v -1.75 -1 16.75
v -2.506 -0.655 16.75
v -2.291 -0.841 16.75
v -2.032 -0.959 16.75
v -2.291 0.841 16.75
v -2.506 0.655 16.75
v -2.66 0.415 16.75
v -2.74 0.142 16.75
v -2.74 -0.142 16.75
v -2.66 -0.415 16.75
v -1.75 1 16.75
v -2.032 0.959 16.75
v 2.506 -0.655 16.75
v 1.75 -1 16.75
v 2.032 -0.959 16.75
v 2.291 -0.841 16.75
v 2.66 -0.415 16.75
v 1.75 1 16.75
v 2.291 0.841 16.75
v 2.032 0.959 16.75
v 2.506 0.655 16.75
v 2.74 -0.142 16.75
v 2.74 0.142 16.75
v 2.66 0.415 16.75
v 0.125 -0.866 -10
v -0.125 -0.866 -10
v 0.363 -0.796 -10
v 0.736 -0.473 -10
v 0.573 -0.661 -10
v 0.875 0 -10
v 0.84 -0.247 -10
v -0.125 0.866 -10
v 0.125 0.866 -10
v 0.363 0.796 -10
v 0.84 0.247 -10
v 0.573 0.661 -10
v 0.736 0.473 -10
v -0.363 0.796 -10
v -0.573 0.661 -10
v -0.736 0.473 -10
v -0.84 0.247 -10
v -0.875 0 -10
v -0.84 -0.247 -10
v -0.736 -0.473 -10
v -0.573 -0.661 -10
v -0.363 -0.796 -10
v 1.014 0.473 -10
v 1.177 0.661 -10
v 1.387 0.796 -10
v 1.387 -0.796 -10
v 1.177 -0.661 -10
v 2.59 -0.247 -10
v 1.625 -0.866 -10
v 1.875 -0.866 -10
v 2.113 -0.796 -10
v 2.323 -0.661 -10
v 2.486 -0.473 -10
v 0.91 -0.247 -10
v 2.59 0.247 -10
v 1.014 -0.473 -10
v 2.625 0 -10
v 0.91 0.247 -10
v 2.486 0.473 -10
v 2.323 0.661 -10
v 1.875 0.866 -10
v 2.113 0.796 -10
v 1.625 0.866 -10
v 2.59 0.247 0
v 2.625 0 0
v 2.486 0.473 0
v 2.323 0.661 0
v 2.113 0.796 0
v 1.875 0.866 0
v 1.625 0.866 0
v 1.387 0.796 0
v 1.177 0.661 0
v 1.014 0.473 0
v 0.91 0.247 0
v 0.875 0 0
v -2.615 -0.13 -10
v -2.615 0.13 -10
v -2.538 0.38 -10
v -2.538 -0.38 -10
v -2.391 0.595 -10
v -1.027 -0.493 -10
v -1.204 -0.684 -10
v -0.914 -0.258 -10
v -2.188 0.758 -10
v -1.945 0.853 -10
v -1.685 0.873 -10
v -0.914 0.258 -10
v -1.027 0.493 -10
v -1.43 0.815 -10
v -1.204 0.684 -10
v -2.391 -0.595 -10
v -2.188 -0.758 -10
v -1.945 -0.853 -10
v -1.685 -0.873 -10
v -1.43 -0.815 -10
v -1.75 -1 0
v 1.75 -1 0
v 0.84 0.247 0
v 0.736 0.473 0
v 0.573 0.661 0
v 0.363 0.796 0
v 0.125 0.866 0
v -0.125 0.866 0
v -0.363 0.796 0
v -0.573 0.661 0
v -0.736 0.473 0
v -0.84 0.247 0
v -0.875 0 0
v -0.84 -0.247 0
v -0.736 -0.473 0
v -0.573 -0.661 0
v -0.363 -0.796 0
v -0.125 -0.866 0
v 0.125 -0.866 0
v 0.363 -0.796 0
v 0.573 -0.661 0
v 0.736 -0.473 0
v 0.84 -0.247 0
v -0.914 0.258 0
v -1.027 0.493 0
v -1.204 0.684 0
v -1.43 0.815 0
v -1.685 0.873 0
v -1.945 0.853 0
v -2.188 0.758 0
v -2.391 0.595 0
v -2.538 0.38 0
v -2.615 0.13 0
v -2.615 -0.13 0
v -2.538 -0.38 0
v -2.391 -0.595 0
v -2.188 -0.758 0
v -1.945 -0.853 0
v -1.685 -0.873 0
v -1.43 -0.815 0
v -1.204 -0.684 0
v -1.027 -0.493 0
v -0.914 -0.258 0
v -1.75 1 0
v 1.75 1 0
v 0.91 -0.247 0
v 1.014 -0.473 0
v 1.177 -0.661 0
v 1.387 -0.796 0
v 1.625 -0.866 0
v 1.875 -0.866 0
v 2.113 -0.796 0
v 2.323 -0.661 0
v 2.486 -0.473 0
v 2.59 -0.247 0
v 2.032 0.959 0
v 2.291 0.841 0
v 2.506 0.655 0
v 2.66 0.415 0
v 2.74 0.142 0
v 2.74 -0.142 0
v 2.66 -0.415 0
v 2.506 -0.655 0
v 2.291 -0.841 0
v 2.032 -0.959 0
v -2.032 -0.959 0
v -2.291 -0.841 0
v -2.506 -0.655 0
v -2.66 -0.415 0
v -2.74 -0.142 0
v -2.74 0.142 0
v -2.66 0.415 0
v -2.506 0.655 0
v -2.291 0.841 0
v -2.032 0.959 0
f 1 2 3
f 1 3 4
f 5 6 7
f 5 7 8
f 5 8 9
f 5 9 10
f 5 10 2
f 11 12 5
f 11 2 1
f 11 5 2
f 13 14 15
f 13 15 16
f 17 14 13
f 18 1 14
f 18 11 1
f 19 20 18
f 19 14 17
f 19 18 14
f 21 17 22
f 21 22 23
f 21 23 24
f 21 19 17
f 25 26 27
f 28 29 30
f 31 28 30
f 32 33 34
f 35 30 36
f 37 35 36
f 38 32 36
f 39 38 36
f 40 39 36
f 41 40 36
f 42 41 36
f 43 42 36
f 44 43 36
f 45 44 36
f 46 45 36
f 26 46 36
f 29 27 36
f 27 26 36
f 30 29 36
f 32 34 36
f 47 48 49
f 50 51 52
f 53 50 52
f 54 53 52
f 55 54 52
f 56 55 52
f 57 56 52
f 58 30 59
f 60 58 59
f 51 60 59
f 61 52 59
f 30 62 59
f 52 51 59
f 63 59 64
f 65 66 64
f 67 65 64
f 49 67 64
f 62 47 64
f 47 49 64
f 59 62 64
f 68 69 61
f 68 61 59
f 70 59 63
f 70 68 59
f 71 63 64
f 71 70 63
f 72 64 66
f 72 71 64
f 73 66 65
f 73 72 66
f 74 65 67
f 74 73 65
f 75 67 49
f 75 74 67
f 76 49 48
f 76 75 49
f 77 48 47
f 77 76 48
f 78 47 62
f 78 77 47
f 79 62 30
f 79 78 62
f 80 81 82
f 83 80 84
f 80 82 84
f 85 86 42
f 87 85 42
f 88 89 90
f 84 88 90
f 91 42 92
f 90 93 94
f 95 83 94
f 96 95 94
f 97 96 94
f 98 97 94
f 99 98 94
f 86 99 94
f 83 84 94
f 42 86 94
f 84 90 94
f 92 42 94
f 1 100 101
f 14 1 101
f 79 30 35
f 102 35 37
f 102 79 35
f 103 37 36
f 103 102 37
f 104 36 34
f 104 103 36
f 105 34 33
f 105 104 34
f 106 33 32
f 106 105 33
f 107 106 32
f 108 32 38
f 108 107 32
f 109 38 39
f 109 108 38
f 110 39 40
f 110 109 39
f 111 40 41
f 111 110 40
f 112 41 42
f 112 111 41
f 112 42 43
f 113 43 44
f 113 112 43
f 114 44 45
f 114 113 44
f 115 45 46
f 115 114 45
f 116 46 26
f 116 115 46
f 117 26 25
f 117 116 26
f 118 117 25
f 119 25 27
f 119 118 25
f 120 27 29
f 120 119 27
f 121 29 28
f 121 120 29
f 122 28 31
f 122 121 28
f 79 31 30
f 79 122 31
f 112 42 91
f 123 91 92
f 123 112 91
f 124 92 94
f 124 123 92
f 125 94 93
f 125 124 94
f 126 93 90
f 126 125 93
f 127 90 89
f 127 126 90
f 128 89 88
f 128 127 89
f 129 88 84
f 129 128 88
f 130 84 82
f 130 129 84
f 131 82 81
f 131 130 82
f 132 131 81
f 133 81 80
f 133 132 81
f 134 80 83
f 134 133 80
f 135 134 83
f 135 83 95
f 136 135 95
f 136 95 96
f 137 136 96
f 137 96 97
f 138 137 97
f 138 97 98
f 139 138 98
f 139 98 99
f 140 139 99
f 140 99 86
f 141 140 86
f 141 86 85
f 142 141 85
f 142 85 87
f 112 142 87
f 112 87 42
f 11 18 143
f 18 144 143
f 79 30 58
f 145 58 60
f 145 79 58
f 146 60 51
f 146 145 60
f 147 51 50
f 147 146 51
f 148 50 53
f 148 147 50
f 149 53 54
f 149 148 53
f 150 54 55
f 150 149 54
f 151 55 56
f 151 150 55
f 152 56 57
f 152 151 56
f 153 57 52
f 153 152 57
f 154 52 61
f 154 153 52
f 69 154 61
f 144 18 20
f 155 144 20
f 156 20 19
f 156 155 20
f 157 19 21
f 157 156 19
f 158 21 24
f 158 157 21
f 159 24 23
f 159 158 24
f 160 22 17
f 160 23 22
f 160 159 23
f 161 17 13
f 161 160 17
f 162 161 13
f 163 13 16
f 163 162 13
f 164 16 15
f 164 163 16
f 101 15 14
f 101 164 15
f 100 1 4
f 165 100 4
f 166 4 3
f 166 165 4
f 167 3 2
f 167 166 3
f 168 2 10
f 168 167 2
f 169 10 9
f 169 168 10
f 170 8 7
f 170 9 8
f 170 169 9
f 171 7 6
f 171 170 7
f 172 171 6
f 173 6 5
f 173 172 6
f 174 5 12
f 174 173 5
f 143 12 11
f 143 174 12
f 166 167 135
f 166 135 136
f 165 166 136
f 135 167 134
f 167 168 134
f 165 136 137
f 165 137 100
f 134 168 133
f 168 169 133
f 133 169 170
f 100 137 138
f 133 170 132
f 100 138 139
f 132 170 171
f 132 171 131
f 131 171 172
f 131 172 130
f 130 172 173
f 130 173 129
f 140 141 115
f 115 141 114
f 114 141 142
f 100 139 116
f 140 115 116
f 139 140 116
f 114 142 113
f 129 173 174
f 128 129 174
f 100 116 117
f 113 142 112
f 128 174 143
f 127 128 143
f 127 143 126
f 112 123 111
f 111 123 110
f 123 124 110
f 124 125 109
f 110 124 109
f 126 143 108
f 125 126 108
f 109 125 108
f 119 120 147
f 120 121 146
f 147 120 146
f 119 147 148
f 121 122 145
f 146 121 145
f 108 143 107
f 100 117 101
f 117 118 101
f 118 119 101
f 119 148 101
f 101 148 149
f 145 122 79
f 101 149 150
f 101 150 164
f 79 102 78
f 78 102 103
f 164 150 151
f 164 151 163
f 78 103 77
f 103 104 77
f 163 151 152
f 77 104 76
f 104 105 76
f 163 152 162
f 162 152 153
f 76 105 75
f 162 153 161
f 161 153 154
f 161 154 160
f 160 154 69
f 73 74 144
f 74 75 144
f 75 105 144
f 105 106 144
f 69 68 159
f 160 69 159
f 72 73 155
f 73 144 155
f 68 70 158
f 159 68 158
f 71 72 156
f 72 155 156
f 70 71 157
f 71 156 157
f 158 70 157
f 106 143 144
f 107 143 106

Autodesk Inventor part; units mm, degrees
ref_plane "YZ Plane" through (0, 0, 0) normal (1, 0, 0) x (0, 1, 0)
ref_plane "XZ Plane" through (0, 0, 0) normal (0, 1, 0) x (-1, 0, 0)
ref_plane "XY Plane" through (0, 0, 0) normal (0, 0, 1) x (1, 0, 0)
sketch "Sketch1" plane through (0, 0, 0) normal (0, 0, 1) x (1, 0, 0)
  line L0 (-1.75, 0) -> (1.75, 0) construction
  line L1 (-1.75, -1) -> (1.75, -1)
  line L2 (1.75, 1) -> (-1.75, 1)
  arc A0 (-1.75, 1) -> (-1.75, -1) centre (-1.75, 0) ccw
  arc A1 (1.75, -1) -> (1.75, 1) centre (1.75, 0) ccw
  circle A2 centre (0, 0) radius 0.875
  circle A3 centre (1.75, 0) radius 0.875
  circle A4 centre (-1.75, 0) radius 0.875
  point P0 (-0.875, 0)
  point P1 (0.875, 0)
  dimension "d0" = 1.75
  dimension "d1" = 2
  dimension "d4" = 1.75
  dimension "d5" = 1.75
  dimension "d6" = 1.75
extrude "Extrusion1" add sketch "Sketch1" along normal blind 16.75 contours A0 L2 A1 L1 | A2 | A4 | A3
extrude "Extrusion2" add sketch "Sketch1" against normal blind 10 contours A2 | A4 | A3
properties part number "Cable Sleeve" material "Rubber, Silicone"
